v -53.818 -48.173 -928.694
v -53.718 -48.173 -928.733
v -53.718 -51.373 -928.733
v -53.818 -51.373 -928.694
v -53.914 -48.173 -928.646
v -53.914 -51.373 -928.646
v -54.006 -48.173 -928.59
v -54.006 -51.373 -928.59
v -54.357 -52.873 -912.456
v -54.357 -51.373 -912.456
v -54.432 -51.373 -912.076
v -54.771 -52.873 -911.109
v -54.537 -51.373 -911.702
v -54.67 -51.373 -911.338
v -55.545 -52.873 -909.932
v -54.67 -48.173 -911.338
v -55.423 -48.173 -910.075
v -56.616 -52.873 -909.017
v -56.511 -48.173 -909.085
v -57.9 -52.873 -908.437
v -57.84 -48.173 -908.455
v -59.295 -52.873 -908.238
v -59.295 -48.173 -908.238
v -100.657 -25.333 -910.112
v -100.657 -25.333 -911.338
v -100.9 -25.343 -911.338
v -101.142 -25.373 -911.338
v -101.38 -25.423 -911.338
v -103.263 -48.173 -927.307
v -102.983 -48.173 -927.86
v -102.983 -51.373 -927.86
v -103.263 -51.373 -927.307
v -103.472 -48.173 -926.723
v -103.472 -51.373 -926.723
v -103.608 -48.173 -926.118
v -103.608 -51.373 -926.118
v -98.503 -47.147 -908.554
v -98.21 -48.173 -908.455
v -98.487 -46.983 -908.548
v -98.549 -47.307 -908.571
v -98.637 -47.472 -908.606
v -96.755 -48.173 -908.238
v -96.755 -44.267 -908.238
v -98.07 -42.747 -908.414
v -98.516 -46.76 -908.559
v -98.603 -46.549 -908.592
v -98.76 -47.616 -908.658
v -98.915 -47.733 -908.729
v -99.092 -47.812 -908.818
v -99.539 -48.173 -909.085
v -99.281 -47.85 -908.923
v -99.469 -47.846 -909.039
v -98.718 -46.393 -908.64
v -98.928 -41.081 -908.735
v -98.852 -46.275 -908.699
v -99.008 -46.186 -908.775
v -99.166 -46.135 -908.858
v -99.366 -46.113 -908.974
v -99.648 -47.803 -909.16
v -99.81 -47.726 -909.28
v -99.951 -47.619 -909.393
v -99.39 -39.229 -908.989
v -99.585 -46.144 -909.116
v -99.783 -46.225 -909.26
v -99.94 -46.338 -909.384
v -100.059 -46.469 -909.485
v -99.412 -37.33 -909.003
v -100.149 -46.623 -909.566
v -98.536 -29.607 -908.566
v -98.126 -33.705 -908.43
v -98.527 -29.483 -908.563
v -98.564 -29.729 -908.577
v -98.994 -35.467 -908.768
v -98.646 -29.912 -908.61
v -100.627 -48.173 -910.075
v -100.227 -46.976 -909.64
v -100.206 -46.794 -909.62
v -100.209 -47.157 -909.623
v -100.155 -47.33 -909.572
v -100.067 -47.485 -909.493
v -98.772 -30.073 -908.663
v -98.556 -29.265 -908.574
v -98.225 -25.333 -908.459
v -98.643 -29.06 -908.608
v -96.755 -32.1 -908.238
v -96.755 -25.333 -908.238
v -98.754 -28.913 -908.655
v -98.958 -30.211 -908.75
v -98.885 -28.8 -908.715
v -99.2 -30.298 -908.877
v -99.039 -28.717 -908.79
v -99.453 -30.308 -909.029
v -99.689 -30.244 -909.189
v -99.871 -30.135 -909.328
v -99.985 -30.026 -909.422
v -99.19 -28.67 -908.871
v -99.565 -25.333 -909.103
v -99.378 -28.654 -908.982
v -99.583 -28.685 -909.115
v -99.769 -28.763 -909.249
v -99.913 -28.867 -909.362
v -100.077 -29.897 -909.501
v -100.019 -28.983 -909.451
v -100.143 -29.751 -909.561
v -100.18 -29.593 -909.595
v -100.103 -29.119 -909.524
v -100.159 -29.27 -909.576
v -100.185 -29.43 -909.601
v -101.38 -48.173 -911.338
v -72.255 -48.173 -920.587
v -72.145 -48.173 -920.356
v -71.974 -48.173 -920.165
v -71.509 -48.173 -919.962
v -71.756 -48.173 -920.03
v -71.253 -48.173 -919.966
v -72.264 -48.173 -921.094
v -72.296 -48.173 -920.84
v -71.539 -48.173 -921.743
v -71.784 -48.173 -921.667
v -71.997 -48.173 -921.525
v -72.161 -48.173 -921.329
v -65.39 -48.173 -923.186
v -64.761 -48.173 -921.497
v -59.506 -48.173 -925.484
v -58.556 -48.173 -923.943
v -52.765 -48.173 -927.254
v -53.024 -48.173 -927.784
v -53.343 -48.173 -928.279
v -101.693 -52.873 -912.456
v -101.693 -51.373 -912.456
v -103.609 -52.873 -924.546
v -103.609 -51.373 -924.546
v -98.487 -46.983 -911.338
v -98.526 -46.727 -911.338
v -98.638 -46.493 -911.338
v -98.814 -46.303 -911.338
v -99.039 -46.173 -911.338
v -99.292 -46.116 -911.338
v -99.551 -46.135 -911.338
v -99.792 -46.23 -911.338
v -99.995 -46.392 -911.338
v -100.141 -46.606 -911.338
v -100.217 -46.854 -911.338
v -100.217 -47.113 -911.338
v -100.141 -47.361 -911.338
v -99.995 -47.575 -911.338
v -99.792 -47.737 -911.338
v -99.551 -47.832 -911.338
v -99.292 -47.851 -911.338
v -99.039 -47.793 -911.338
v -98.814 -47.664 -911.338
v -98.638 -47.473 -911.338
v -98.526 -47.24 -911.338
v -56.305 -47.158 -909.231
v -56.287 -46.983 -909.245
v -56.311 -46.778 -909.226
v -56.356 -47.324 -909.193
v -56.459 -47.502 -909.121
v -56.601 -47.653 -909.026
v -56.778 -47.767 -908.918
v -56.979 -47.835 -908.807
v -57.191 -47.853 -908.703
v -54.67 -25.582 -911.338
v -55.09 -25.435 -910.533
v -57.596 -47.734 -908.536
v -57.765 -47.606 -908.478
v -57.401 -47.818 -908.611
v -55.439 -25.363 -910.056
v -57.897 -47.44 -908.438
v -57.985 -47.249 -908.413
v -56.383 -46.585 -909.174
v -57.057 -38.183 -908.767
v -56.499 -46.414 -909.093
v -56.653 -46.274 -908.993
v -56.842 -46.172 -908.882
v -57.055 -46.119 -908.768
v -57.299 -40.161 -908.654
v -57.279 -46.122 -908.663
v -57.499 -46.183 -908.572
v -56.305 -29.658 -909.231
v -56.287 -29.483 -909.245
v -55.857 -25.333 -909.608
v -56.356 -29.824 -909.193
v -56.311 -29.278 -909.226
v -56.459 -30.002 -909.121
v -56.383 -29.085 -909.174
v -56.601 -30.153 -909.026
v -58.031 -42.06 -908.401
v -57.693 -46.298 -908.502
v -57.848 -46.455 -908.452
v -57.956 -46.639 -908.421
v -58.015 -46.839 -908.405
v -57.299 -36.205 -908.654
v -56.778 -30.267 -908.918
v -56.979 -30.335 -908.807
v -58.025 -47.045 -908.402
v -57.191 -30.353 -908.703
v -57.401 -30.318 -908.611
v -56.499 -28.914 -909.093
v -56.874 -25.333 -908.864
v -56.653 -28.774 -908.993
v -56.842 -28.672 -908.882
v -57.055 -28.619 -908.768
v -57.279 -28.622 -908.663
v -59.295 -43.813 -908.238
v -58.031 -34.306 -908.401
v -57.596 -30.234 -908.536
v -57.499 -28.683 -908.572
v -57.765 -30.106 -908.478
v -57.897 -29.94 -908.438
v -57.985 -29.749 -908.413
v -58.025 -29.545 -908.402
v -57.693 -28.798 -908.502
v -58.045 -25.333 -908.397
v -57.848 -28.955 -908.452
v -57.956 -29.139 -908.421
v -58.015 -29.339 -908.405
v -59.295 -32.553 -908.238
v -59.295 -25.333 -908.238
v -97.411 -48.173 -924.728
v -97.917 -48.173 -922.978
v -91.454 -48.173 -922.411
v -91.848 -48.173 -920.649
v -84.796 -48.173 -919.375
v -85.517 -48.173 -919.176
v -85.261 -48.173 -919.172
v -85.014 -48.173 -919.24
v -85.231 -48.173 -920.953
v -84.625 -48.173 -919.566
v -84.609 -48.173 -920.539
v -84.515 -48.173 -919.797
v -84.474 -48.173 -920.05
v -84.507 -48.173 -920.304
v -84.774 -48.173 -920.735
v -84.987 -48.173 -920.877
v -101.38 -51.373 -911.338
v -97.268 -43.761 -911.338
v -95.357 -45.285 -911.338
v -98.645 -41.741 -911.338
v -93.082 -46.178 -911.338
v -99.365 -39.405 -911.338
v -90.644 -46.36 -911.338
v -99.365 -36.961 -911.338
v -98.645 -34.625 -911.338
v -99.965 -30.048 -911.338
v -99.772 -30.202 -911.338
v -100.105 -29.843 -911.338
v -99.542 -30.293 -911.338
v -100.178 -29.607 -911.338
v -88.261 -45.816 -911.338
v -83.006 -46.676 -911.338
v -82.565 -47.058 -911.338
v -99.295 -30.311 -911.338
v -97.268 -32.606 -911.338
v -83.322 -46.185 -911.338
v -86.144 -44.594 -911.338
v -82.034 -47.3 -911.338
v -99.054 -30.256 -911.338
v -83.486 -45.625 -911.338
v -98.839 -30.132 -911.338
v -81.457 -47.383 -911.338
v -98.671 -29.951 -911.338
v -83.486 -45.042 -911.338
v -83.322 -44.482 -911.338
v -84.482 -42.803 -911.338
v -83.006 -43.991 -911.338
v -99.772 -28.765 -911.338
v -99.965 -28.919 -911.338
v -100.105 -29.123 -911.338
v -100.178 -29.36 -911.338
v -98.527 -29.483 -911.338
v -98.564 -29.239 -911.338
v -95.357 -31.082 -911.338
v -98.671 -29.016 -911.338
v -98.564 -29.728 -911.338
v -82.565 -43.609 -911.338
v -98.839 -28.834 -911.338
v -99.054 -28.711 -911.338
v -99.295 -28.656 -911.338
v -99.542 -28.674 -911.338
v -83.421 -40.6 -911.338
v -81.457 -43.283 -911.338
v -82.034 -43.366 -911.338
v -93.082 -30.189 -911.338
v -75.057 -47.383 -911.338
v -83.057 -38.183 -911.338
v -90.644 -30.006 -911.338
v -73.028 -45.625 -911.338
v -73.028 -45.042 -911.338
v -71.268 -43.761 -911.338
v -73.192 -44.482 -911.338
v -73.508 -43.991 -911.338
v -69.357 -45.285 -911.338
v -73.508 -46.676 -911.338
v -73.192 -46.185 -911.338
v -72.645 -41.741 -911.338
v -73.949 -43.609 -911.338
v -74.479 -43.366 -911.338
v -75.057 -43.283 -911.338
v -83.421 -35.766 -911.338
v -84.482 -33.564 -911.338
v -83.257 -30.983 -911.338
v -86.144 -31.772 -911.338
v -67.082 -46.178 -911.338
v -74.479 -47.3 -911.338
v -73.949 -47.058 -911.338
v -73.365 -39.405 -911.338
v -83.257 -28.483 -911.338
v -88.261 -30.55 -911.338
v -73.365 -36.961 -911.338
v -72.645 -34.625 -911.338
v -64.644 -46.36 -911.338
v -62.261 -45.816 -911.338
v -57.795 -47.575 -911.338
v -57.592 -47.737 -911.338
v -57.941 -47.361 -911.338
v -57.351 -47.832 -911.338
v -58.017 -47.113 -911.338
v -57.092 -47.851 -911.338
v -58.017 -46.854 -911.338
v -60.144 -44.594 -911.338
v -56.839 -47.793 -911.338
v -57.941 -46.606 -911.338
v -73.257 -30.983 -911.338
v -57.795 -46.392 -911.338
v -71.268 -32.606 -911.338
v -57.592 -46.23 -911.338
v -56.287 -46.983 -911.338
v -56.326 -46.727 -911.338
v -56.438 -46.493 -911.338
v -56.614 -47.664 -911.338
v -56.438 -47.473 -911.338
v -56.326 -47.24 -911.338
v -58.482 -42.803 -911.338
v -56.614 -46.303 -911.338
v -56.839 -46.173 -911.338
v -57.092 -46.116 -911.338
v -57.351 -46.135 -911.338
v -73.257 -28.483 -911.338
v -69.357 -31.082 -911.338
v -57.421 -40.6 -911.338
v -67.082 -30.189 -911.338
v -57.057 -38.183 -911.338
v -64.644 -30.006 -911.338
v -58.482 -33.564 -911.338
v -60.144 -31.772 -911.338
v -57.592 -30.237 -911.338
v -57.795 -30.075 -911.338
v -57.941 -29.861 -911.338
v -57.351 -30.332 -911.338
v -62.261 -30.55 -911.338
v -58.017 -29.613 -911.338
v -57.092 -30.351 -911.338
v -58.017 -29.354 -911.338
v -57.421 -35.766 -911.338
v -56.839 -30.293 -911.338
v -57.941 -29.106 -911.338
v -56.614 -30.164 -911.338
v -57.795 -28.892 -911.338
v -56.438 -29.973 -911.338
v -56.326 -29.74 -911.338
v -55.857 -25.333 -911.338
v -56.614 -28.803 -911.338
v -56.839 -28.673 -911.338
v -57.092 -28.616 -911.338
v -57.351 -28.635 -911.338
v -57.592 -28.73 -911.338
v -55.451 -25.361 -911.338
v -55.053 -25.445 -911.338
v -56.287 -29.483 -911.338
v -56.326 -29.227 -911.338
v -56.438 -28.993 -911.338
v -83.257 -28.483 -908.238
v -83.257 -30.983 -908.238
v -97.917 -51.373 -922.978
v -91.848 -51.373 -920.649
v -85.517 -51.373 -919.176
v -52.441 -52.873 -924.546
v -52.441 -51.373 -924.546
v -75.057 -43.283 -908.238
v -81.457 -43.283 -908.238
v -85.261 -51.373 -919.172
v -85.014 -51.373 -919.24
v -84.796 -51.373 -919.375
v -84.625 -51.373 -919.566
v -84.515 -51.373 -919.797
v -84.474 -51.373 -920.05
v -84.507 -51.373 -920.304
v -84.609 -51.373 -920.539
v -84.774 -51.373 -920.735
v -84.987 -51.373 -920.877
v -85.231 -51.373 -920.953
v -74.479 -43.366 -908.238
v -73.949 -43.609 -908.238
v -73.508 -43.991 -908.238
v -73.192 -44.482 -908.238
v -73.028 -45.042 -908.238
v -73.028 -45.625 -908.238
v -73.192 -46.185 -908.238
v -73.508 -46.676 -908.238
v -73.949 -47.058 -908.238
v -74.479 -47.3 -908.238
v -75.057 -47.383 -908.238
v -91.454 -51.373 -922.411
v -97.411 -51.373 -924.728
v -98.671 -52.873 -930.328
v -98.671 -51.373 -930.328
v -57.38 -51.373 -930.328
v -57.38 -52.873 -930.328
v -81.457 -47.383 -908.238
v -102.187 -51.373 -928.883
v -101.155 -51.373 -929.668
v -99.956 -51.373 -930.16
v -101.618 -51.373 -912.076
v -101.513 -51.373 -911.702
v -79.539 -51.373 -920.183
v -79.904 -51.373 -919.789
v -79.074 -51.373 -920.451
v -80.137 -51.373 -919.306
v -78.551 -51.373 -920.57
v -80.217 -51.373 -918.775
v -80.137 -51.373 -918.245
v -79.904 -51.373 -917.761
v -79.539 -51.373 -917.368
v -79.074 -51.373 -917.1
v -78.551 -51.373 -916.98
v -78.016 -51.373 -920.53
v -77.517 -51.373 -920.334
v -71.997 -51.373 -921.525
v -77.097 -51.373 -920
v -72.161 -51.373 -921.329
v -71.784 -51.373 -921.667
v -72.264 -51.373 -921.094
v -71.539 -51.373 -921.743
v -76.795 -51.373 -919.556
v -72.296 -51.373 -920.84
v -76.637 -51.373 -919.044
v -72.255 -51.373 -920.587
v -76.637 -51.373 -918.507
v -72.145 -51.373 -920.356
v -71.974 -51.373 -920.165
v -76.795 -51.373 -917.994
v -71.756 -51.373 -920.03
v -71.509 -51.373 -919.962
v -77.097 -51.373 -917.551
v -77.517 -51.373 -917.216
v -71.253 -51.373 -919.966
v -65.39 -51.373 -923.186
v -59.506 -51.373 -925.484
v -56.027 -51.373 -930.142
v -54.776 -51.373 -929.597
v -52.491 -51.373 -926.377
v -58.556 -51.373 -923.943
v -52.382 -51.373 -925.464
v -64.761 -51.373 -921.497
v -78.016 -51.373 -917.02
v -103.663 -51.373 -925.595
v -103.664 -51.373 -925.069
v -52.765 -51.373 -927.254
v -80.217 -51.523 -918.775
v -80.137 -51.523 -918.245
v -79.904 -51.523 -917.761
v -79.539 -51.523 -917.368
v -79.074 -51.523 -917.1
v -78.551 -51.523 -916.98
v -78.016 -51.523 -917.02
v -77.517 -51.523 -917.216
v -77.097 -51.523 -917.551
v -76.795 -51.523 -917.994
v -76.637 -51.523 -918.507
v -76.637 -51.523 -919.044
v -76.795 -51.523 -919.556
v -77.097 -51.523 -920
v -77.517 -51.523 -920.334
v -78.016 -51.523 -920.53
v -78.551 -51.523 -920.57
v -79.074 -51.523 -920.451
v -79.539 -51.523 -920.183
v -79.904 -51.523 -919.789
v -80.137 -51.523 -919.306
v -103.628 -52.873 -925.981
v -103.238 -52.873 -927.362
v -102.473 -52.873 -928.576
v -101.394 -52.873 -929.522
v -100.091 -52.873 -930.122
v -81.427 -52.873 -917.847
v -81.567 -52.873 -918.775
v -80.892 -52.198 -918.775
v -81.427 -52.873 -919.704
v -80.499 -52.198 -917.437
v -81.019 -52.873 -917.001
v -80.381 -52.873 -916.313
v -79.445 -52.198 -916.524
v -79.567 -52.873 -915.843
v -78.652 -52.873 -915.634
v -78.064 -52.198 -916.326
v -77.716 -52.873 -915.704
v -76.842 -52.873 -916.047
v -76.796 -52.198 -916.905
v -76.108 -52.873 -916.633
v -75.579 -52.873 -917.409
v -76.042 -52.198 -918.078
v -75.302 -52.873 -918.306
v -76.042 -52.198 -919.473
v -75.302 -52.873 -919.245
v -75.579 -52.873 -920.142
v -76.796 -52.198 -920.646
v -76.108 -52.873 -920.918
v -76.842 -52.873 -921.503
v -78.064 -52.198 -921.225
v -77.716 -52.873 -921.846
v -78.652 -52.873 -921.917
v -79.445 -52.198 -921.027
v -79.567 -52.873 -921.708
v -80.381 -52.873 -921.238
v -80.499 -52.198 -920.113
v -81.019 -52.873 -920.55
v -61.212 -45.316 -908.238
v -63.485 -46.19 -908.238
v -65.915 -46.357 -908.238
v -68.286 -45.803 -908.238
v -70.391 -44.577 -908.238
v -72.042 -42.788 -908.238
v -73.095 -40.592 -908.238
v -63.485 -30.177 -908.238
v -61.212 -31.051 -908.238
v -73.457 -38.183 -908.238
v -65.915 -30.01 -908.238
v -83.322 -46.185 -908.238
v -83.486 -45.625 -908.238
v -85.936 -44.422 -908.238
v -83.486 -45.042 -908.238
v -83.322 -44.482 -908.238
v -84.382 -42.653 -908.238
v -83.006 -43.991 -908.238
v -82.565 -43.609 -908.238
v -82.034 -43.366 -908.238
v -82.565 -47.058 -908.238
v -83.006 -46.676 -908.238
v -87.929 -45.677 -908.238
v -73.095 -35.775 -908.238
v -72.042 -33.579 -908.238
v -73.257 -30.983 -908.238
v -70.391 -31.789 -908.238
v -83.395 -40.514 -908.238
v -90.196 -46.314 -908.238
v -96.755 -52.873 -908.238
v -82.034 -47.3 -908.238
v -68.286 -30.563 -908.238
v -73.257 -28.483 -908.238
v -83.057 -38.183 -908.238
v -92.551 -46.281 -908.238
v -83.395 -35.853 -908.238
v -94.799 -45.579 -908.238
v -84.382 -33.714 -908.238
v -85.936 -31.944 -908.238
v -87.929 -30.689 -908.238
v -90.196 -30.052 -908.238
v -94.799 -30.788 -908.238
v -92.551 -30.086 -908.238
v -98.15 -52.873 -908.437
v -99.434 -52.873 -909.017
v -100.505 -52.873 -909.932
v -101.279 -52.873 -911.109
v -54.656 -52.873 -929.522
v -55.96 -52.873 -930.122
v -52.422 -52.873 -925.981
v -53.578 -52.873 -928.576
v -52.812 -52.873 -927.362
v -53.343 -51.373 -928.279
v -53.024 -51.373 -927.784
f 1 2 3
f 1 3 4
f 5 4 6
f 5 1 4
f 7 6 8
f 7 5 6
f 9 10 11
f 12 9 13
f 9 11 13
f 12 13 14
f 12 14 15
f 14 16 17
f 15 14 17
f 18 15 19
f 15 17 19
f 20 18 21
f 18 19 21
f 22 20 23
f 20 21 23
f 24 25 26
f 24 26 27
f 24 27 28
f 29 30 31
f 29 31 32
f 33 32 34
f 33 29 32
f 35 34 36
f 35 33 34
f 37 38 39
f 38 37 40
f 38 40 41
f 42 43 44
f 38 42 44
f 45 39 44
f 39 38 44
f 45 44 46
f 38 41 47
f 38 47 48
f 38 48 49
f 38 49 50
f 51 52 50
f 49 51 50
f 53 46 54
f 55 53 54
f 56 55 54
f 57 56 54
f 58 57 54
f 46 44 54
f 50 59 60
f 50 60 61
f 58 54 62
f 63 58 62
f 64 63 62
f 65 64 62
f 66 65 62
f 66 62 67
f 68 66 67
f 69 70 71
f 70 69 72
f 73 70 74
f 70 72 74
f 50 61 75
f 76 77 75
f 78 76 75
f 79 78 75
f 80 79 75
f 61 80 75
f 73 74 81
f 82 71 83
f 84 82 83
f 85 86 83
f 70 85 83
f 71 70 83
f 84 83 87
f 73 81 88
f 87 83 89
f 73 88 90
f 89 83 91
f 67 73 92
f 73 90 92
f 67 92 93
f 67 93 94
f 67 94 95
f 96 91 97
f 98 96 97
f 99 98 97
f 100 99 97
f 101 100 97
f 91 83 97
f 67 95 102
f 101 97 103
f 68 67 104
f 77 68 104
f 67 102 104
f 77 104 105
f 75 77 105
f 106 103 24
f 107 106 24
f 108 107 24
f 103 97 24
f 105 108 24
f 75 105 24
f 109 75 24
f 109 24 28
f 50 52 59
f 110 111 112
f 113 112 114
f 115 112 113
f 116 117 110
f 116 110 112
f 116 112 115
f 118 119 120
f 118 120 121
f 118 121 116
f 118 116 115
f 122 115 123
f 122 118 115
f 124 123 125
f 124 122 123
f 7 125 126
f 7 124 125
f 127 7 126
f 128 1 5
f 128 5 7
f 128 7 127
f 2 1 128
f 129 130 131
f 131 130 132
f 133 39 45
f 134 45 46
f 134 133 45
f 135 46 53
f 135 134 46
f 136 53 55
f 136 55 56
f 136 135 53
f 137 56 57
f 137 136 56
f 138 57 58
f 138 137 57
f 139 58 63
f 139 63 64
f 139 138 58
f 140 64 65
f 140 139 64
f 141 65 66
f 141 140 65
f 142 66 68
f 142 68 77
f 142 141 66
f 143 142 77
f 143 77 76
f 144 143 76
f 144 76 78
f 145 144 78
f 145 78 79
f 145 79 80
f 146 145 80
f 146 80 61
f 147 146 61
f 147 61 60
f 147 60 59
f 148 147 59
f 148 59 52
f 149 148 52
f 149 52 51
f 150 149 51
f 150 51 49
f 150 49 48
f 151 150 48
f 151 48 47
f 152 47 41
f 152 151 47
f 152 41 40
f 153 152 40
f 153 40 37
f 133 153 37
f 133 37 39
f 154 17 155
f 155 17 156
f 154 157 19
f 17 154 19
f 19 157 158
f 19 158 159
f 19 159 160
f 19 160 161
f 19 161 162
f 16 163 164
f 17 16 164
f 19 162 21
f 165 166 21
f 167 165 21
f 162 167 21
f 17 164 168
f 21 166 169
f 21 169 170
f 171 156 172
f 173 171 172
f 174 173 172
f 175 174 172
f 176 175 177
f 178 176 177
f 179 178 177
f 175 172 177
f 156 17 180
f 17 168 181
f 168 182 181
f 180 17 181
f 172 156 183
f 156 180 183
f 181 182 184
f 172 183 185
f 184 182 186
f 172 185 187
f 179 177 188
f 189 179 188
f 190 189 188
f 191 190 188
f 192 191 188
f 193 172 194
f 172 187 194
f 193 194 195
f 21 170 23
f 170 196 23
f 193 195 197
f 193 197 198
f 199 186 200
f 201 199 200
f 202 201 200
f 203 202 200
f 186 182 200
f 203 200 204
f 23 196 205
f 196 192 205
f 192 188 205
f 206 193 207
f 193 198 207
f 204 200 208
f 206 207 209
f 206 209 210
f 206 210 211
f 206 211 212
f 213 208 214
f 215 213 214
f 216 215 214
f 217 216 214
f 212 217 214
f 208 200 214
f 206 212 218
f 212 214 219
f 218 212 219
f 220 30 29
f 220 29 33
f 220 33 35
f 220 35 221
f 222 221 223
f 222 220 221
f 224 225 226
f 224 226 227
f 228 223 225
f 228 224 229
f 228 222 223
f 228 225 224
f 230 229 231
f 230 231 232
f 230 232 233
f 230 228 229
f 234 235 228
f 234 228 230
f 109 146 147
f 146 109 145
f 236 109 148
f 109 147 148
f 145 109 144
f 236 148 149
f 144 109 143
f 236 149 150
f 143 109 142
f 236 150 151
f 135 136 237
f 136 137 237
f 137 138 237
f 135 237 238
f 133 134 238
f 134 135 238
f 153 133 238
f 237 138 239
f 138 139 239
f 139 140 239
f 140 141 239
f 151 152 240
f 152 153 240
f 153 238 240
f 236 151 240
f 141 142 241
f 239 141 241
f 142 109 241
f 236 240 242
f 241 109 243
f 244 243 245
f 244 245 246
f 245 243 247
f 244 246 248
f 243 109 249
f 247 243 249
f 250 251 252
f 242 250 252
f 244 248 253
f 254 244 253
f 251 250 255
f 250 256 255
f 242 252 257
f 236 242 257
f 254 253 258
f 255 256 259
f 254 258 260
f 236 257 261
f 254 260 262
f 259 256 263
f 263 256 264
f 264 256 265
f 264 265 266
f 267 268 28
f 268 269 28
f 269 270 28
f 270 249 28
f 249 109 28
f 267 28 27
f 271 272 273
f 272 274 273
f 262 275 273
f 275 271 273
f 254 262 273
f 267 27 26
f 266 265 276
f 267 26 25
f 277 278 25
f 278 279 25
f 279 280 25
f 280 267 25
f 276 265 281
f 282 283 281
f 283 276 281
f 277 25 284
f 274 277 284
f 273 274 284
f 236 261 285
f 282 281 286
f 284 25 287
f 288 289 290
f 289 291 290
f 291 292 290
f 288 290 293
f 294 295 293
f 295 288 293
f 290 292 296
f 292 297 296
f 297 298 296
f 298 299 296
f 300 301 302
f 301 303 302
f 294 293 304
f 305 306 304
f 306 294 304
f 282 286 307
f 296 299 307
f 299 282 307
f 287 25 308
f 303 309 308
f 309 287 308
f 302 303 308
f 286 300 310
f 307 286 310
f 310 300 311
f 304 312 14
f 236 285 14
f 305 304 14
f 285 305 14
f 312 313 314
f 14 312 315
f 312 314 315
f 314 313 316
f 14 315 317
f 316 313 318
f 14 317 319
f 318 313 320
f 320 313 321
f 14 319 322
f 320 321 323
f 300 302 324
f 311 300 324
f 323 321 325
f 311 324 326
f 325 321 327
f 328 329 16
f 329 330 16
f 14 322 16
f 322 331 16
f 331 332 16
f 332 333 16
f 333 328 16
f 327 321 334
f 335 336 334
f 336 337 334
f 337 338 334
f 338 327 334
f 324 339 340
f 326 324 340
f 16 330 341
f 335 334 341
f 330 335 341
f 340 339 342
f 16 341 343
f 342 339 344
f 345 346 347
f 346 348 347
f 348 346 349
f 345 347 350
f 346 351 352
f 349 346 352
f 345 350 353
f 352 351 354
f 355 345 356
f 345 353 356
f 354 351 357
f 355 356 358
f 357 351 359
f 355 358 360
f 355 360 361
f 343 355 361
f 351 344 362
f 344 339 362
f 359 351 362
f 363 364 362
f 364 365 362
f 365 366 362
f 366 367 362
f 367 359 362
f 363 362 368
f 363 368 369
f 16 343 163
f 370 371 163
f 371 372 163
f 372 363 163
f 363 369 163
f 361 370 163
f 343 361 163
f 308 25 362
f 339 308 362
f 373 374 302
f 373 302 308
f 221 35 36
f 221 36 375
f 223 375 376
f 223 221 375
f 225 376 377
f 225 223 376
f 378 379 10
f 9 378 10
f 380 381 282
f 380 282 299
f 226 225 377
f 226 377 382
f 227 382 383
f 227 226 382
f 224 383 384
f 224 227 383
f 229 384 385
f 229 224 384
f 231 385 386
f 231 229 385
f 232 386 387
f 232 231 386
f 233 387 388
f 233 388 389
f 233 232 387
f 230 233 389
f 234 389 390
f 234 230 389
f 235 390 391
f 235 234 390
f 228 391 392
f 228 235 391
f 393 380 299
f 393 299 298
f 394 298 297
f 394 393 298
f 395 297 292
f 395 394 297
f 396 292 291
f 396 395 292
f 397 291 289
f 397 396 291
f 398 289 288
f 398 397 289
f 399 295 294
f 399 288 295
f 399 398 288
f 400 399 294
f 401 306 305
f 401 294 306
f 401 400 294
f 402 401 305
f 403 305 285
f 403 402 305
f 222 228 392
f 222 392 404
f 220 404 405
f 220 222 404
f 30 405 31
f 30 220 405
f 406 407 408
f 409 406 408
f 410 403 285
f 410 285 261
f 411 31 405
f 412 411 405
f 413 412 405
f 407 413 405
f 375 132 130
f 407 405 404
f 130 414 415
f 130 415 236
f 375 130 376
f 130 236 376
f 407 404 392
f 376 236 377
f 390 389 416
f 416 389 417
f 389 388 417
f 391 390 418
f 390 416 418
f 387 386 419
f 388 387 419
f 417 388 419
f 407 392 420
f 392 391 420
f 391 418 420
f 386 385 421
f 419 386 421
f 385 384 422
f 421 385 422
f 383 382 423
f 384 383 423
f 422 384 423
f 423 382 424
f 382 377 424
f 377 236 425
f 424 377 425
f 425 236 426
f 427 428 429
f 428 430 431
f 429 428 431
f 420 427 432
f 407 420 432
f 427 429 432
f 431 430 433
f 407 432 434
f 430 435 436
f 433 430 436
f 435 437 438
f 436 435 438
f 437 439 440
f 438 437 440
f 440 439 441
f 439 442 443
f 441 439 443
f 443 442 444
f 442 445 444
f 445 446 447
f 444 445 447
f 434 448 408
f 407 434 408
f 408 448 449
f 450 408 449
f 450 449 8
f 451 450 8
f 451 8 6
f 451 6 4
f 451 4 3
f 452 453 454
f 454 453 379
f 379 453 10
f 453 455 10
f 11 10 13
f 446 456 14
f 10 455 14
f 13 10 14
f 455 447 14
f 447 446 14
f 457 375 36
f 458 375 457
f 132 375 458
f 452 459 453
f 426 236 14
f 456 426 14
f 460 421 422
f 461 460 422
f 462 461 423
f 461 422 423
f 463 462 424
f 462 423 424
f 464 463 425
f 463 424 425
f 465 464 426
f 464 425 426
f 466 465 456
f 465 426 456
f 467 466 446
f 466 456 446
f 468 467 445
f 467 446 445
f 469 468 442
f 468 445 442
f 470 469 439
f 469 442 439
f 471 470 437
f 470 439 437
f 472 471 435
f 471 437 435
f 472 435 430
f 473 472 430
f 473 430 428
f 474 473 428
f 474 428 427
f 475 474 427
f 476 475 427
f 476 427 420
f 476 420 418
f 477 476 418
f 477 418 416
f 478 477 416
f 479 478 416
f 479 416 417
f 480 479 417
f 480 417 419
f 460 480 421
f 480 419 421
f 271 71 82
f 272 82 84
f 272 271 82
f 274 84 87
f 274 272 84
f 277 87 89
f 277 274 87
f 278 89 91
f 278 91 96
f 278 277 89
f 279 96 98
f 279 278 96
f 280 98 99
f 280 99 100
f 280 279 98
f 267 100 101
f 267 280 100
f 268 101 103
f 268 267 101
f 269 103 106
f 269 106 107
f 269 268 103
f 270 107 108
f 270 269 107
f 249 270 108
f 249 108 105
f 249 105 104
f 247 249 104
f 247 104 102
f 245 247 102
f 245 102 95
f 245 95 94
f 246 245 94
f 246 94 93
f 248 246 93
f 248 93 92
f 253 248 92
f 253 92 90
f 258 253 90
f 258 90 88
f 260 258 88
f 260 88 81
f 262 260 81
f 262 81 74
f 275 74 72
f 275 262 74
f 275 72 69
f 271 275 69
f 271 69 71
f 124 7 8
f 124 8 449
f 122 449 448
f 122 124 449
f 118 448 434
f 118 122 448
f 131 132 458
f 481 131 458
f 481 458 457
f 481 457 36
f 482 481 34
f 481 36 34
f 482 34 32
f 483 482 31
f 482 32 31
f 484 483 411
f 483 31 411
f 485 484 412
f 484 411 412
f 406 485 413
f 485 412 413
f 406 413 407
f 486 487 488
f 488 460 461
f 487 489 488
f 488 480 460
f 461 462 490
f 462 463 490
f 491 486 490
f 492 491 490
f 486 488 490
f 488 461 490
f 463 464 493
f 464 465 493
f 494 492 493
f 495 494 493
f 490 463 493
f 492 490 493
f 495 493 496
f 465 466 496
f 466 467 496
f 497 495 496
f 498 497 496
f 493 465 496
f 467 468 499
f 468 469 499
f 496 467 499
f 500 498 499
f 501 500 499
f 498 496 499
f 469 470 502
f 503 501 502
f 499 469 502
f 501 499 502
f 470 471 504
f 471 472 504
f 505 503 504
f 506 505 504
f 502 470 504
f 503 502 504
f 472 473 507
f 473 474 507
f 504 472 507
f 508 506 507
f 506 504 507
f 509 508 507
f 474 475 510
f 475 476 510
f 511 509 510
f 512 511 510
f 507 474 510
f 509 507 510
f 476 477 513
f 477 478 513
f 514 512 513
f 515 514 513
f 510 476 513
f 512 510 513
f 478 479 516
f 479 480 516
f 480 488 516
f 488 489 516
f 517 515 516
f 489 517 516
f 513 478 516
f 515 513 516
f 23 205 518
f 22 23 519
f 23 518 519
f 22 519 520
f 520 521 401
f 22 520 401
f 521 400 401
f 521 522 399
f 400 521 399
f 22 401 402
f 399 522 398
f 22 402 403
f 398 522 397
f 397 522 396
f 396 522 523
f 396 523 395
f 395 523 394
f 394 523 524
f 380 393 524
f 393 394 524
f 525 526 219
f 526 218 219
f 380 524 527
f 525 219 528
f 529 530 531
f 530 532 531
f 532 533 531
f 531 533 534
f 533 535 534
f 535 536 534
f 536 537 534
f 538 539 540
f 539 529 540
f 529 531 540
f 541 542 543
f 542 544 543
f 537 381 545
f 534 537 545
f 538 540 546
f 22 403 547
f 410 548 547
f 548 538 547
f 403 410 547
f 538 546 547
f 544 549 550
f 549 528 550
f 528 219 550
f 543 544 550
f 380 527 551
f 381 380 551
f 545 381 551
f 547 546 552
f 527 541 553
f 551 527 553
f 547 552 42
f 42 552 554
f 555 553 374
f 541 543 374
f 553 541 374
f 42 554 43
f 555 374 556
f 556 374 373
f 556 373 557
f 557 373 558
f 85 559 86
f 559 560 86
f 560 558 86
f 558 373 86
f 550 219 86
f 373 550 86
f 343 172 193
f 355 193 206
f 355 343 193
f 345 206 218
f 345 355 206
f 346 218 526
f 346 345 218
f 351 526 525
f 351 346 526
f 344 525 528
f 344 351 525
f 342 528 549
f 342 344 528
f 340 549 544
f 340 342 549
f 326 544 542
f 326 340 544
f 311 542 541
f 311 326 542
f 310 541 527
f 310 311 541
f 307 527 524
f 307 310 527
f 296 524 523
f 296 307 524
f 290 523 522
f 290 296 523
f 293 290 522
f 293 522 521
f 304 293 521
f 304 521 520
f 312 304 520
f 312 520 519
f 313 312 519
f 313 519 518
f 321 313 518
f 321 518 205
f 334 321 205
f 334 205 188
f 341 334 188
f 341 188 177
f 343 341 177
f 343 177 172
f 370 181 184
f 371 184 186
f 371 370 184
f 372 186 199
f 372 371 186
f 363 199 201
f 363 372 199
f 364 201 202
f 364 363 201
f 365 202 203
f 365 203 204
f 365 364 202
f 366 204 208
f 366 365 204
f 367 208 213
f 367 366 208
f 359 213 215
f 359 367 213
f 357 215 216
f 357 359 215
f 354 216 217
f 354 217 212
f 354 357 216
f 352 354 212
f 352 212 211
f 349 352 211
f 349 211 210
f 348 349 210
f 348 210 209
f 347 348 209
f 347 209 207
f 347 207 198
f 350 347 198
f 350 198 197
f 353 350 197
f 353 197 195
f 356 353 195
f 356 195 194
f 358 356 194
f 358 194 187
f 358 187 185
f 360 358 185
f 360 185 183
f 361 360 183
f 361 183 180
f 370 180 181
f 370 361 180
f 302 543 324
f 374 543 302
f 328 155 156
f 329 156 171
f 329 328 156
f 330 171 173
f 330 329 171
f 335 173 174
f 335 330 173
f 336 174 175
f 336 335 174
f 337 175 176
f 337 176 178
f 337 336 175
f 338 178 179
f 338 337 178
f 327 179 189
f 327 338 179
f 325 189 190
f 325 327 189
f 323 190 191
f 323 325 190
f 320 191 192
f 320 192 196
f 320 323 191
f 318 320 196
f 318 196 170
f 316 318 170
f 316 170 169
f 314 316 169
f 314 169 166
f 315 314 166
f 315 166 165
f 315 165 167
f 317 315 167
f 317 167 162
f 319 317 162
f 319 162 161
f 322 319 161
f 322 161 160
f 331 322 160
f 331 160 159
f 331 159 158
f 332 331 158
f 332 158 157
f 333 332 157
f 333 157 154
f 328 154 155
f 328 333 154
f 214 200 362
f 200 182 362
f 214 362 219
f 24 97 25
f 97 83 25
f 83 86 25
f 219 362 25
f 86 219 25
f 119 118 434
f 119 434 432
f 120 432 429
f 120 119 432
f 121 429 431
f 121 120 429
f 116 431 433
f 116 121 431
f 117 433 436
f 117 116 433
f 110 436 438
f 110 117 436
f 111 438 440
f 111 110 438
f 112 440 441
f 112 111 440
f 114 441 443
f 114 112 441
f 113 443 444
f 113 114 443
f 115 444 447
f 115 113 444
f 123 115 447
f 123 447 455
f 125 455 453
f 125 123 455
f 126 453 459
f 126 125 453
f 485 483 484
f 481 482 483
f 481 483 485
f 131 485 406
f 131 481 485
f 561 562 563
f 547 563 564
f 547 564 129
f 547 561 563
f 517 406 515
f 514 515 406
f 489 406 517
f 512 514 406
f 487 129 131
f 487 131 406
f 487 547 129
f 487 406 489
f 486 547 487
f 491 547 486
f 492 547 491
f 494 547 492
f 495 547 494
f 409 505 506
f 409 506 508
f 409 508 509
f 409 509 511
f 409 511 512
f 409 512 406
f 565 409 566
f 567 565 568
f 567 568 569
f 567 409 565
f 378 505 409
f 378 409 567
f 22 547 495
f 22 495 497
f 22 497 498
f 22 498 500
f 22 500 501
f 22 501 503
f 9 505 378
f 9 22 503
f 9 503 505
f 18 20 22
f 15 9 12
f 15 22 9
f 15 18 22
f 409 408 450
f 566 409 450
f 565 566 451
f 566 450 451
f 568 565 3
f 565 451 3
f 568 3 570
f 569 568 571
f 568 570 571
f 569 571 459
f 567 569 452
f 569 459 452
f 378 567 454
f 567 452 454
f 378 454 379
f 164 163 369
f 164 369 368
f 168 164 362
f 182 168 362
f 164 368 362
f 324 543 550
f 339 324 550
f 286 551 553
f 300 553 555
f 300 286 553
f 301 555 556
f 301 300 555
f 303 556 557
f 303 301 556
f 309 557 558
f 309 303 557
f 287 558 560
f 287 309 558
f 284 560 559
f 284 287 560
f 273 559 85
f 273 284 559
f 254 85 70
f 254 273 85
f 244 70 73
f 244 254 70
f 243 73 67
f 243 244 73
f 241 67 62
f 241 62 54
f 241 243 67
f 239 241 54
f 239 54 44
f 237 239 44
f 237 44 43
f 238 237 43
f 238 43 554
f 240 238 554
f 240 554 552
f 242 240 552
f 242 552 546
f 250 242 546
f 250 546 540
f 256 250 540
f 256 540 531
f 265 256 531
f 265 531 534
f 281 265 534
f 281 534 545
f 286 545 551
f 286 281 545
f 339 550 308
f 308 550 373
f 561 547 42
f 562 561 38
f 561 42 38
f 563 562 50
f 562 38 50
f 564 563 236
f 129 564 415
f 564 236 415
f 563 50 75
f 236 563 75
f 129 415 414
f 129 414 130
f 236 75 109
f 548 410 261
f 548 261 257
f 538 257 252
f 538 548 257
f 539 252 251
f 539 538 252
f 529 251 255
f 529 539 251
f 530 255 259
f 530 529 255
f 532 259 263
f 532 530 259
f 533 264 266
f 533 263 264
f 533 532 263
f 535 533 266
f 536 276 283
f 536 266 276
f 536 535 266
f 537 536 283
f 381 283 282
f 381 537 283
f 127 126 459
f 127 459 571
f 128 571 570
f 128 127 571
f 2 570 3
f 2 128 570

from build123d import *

# Parameters (mm, degrees)
BOSS_EXTRU_1_DEPTH                                = 1.5
BOSS_EXTRU_2_START                                = 0.3
ESQUISSE2_R                                       = 0.83
ESQUISSE2_R_2                                     = 0.87
ESQUISSE2_R_3                                     = 8.2
BOSS_EXTRU_2_DEPTH                                = 3.2
ENL_V_MAT_EXTRU_1_DEPTH                           = 937.37300154
ENL_V_MAT_EXTRU_1_DEPTH_BACK                      = 937.37300154
ESQUISSE1_2_OUTSIDE_W                             = 65.507
ESQUISSE1_2_OUTSIDE_H                             = 36.406
BOSS_EXTRU_3_START                                = 3.2
BOSS_EXTRU_3_DEPTH                                = 3.2
FRAISAGE_POUR_VIS_T_TE_FRAIS_E_BOMB_E_D           = 3.6
FRAISAGE_POUR_VIS_T_TE_FRAIS_E_BOMB_E_CSINK_D     = 6.3
FRAISAGE_POUR_VIS_T_TE_FRAIS_E_BOMB_E_CSINK_ANGLE = 90
ENL_V_MAT_EXTRU_2_DEPTH                           = 118.914346143
ENL_V_MAT_EXTRU_2_DEPTH_BACK                      = 118.914346143
ESQUISSE8_W                                       = 10.000000119
ESQUISSE8_H                                       = 2.5
ESQUISSE9_W                                       = 46.70954475
ESQUISSE9_H                                       = 0.31
ENL_V_MAT_EXTRU_3_DEPTH                           = 10
BOSS_EXTRU_4_DEPTH                                = 3.39
ENL_V_MAT_EXTRU_4_DEPTH                           = 10


with BuildPart() as part:
    # Esquisse1 → Boss.-Extru.1 (new body)
    with BuildSketch(Plane.XZ.offset(51.373319983)):
        with BuildLine():
            Line((-98.670544596, -930.328379496), (-57.379707563, -930.328379496))
            ThreePointArc((-57.379707563, -930.328379496), (-53.577586343, -928.575512729), (-52.441309896, -924.545929189))
            Line((-52.441309896, -924.545929189), (-54.35688847, -912.455846702))
            ThreePointArc((-54.35688847, -912.455846702), (-56.048152904, -909.43617579), (-59.295286137, -908.238297009))
            Line((-59.295286137, -908.238297009), (-96.754966023, -908.238297009))
            ThreePointArc((-96.754966023, -908.238297009), (-100.002099255, -909.43617579), (-101.69336369, -912.455846702))
            Line((-101.69336369, -912.455846702), (-103.608942263, -924.545929189))
            ThreePointArc((-103.608942263, -924.545929189), (-102.472665816, -928.575512729), (-98.670544596, -930.328379496))
        make_face()
    extrude(amount=BOSS_EXTRU_1_DEPTH)

    # Esquisse2 → Boss.-Extru.2 (add)
    with BuildSketch(Plane.XY.offset(-911.638297009).offset(BOSS_EXTRU_2_START)):
        with BuildLine():
            Line((-52.906931145, -51.073319983), (-52.906931145, -31.173319983))
            ThreePointArc((-52.906931145, -31.173319983), (-53.77096614, -29.087354978), (-55.856931145, -28.223319983))
            Line((-55.856931145, -28.223319983), (-100.656931145, -28.223319983))
            ThreePointArc((-100.656931145, -28.223319983), (-102.742896149, -29.087354978), (-103.606931145, -31.173319983))
            Line((-103.606931145, -31.173319983), (-103.606931145, -51.073319983))
            Line((-103.606931145, -51.073319983), (-103.608942263, -51.373319983))
            Line((-103.608942263, -51.373319983), (-52.906931145, -51.373319983))
            Line((-52.906931145, -51.373319983), (-52.906931145, -51.073319983))
        make_face()
        with Locations((-99.356931145, -32.373319983)):
            Circle(ESQUISSE2_R, mode=Mode.SUBTRACT)
        with Locations((-99.356931145, -49.873319983)):
            Circle(ESQUISSE2_R_2, mode=Mode.SUBTRACT)
        with Locations((-57.156931145, -49.873319983)):
            Circle(ESQUISSE2_R_2, mode=Mode.SUBTRACT)
        with Locations((-57.156931145, -32.373319983)):
            Circle(ESQUISSE2_R_2, mode=Mode.SUBTRACT)
        with Locations((-91.256931145, -41.073319983)):
            Circle(ESQUISSE2_R_3, mode=Mode.SUBTRACT)
        with Locations((-65.256931145, -41.073319983)):
            Circle(ESQUISSE2_R_3, mode=Mode.SUBTRACT)
    extrude(amount=BOSS_EXTRU_2_DEPTH)

    # Esquisse1<2> outside → Enlèv. mat.-Extru.1 (cut, two sides: drawn at the far end of the back side and taken through both)
    with BuildSketch(Plane.XZ.offset(51.373319983).offset(-ENL_V_MAT_EXTRU_1_DEPTH_BACK)):
        with Locations((-78.0255, -919.233)):
            Rectangle(ESQUISSE1_2_OUTSIDE_W, ESQUISSE1_2_OUTSIDE_H)
        with BuildLine():
            Line((-98.670544596, -930.328379496), (-57.379707563, -930.328379496))
            ThreePointArc((-57.379707563, -930.328379496), (-53.577586343, -928.575512729), (-52.441309896, -924.545929189))
            Line((-52.441309896, -924.545929189), (-54.35688847, -912.455846702))
            ThreePointArc((-54.35688847, -912.455846702), (-56.048152904, -909.43617579), (-59.295286137, -908.238297009))
            Line((-59.295286137, -908.238297009), (-96.754966023, -908.238297009))
            ThreePointArc((-96.754966023, -908.238297009), (-100.002099255, -909.43617579), (-101.69336369, -912.455846702))
            Line((-101.69336369, -912.455846702), (-103.608942263, -924.545929189))
            ThreePointArc((-103.608942263, -924.545929189), (-102.472665816, -928.575512729), (-98.670544596, -930.328379496))
        make_face(mode=Mode.SUBTRACT)
    extrude(amount=ENL_V_MAT_EXTRU_1_DEPTH + ENL_V_MAT_EXTRU_1_DEPTH_BACK, mode=Mode.SUBTRACT)

    # Esquisse3 → Boss.-Extru.3 (add)
    with BuildSketch(Plane(origin=(0, -51.373319983, 0), x_dir=(1, 0, 0), z_dir=(0, 1, 0)).offset(BOSS_EXTRU_3_START)):
        with BuildLine():
            ThreePointArc((-102.982508149, 927.859578881), (-103.376352569, 927.018163899), (-103.607735067, 926.118411302))
            ThreePointArc((-103.607735067, 926.118411302), (-94.922727103, 921.708622836), (-85.517242835, 919.176338626))
            ThreePointArc((-85.517242835, 919.176338626), (-84.485661398, 919.92188523), (-85.231208003, 920.953466667))
            ThreePointArc((-85.231208003, 920.953466667), (-94.473289986, 923.464655248), (-102.982508149, 927.859578881))
        make_face()
        with BuildLine():
            ThreePointArc((-71.253122945, 919.966173311), (-61.614344657, 922.608295593), (-52.765422079, 927.254092215))
            ThreePointArc((-52.765422079, 927.254092215), (-53.176239028, 928.035934163), (-53.718212164, 928.733295272))
            ThreePointArc((-53.718212164, 928.733295272), (-53.866494414, 928.670740496), (-54.005911098, 928.59034327))
            ThreePointArc((-54.005911098, 928.59034327), (-62.407028515, 924.230869883), (-71.539157777, 921.743301352))
            ThreePointArc((-71.539157777, 921.743301352), (-72.284704381, 920.711719915), (-71.253122945, 919.966173311))
        make_face()
    extrude(amount=-BOSS_EXTRU_3_DEPTH)

    # Fraisage pour vis à tête fraisée bombée M31 (through all)
    with Locations(Plane.XZ.offset(52.873319983)):
        with Locations((-78.416666646, -918.775310047)):
            CounterSinkHole(FRAISAGE_POUR_VIS_T_TE_FRAIS_E_BOMB_E_D / 2, FRAISAGE_POUR_VIS_T_TE_FRAIS_E_BOMB_E_CSINK_D / 2, counter_sink_angle=FRAISAGE_POUR_VIS_T_TE_FRAIS_E_BOMB_E_CSINK_ANGLE)

    # Esquisse8 → Enlèv. mat.-Extru.2 (cut, two sides: drawn at the far end of the back side and taken through both)
    with BuildSketch(Plane(origin=(0, 0, -911.338297009), x_dir=(-1, 0, 0), z_dir=(0, 0, -1)).offset(-ENL_V_MAT_EXTRU_2_DEPTH_BACK)):
        with Locations((78.256931086, -32.623319983)):
            Rectangle(ESQUISSE8_W, ESQUISSE8_H)
    extrude(amount=ENL_V_MAT_EXTRU_2_DEPTH + ENL_V_MAT_EXTRU_2_DEPTH_BACK, mode=Mode.SUBTRACT)

    # Esquisse9 → Enlèv. mat.-Extru.3 (cut)
    with BuildSketch(Plane.XY.offset(-908.238297009)):
        with Locations((-78.02512608, -51.218319983)):
            Rectangle(ESQUISSE9_W, ESQUISSE9_H)
    extrude(amount=-ENL_V_MAT_EXTRU_3_DEPTH, mode=Mode.SUBTRACT)


with BuildPart() as enl_v_mat_extru_3_piece_1:
    # of the separate pieces the step leaves, piece 1, a body of its own (enl_v_mat_extru_3_pieces)
    add(part.part.solids().sort_by_distance((-101.69336369, -51.373319983, -912.455846702))[0])



with BuildPart() as enl_v_mat_extru_3_piece_2:
    # of the separate pieces the step leaves, piece 2, a body of its own (enl_v_mat_extru_3_pieces)
    add(part.part.solids().sort_by_distance((-96.754966023, -51.063319983, -908.238297009))[0])


with BuildPart() as enl_v_mat_extru_3_piece_2_1:
    # Corps-Déplacer/Copier1: moved
    add(enl_v_mat_extru_3_piece_2.part.moved(Location((0, 2.89, 0))))


with BuildPart() as enl_v_mat_extru_3_piece_1_1:
    add(enl_v_mat_extru_3_piece_1.part)

    add(enl_v_mat_extru_3_piece_2_1.part)  # Boss.-Extru.4 merges Enlèv. mat.-Extru.3 piece 2
    # Esquisse10 → Boss.-Extru.4 (add)
    with BuildSketch(Plane.XZ.offset(48.173319983)):
        with BuildLine():
            Line((-59.295286137, -908.238297009), (-96.754966023, -908.238297009))
            ThreePointArc((-96.754966023, -908.238297009), (-99.538848204, -909.084985078), (-101.379898455, -911.338297009))
            Line((-101.379898455, -911.338297009), (-54.670353705, -911.338297009))
            ThreePointArc((-54.670353705, -911.338297009), (-56.511403955, -909.084985078), (-59.295286137, -908.238297009))
        make_face()
    extrude(amount=BOSS_EXTRU_4_DEPTH)

    # Esquisse11 → Enlèv. mat.-Extru.4 (cut)
    with BuildSketch(Plane.XY.offset(-908.238297009)):
        with BuildLine():
            Line((-81.456931145, -43.283319983), (-75.056931145, -43.283319983))
            ThreePointArc((-75.056931145, -43.283319983), (-73.006931145, -45.333319983), (-75.056931145, -47.383319983))
            Line((-75.056931145, -47.383319983), (-81.456931145, -47.383319983))
            ThreePointArc((-81.456931145, -47.383319983), (-83.506931145, -45.333319983), (-81.456931145, -43.283319983))
        make_face()
    extrude(amount=-ENL_V_MAT_EXTRU_4_DEPTH, mode=Mode.SUBTRACT)


solid = enl_v_mat_extru_3_piece_1_1.part
